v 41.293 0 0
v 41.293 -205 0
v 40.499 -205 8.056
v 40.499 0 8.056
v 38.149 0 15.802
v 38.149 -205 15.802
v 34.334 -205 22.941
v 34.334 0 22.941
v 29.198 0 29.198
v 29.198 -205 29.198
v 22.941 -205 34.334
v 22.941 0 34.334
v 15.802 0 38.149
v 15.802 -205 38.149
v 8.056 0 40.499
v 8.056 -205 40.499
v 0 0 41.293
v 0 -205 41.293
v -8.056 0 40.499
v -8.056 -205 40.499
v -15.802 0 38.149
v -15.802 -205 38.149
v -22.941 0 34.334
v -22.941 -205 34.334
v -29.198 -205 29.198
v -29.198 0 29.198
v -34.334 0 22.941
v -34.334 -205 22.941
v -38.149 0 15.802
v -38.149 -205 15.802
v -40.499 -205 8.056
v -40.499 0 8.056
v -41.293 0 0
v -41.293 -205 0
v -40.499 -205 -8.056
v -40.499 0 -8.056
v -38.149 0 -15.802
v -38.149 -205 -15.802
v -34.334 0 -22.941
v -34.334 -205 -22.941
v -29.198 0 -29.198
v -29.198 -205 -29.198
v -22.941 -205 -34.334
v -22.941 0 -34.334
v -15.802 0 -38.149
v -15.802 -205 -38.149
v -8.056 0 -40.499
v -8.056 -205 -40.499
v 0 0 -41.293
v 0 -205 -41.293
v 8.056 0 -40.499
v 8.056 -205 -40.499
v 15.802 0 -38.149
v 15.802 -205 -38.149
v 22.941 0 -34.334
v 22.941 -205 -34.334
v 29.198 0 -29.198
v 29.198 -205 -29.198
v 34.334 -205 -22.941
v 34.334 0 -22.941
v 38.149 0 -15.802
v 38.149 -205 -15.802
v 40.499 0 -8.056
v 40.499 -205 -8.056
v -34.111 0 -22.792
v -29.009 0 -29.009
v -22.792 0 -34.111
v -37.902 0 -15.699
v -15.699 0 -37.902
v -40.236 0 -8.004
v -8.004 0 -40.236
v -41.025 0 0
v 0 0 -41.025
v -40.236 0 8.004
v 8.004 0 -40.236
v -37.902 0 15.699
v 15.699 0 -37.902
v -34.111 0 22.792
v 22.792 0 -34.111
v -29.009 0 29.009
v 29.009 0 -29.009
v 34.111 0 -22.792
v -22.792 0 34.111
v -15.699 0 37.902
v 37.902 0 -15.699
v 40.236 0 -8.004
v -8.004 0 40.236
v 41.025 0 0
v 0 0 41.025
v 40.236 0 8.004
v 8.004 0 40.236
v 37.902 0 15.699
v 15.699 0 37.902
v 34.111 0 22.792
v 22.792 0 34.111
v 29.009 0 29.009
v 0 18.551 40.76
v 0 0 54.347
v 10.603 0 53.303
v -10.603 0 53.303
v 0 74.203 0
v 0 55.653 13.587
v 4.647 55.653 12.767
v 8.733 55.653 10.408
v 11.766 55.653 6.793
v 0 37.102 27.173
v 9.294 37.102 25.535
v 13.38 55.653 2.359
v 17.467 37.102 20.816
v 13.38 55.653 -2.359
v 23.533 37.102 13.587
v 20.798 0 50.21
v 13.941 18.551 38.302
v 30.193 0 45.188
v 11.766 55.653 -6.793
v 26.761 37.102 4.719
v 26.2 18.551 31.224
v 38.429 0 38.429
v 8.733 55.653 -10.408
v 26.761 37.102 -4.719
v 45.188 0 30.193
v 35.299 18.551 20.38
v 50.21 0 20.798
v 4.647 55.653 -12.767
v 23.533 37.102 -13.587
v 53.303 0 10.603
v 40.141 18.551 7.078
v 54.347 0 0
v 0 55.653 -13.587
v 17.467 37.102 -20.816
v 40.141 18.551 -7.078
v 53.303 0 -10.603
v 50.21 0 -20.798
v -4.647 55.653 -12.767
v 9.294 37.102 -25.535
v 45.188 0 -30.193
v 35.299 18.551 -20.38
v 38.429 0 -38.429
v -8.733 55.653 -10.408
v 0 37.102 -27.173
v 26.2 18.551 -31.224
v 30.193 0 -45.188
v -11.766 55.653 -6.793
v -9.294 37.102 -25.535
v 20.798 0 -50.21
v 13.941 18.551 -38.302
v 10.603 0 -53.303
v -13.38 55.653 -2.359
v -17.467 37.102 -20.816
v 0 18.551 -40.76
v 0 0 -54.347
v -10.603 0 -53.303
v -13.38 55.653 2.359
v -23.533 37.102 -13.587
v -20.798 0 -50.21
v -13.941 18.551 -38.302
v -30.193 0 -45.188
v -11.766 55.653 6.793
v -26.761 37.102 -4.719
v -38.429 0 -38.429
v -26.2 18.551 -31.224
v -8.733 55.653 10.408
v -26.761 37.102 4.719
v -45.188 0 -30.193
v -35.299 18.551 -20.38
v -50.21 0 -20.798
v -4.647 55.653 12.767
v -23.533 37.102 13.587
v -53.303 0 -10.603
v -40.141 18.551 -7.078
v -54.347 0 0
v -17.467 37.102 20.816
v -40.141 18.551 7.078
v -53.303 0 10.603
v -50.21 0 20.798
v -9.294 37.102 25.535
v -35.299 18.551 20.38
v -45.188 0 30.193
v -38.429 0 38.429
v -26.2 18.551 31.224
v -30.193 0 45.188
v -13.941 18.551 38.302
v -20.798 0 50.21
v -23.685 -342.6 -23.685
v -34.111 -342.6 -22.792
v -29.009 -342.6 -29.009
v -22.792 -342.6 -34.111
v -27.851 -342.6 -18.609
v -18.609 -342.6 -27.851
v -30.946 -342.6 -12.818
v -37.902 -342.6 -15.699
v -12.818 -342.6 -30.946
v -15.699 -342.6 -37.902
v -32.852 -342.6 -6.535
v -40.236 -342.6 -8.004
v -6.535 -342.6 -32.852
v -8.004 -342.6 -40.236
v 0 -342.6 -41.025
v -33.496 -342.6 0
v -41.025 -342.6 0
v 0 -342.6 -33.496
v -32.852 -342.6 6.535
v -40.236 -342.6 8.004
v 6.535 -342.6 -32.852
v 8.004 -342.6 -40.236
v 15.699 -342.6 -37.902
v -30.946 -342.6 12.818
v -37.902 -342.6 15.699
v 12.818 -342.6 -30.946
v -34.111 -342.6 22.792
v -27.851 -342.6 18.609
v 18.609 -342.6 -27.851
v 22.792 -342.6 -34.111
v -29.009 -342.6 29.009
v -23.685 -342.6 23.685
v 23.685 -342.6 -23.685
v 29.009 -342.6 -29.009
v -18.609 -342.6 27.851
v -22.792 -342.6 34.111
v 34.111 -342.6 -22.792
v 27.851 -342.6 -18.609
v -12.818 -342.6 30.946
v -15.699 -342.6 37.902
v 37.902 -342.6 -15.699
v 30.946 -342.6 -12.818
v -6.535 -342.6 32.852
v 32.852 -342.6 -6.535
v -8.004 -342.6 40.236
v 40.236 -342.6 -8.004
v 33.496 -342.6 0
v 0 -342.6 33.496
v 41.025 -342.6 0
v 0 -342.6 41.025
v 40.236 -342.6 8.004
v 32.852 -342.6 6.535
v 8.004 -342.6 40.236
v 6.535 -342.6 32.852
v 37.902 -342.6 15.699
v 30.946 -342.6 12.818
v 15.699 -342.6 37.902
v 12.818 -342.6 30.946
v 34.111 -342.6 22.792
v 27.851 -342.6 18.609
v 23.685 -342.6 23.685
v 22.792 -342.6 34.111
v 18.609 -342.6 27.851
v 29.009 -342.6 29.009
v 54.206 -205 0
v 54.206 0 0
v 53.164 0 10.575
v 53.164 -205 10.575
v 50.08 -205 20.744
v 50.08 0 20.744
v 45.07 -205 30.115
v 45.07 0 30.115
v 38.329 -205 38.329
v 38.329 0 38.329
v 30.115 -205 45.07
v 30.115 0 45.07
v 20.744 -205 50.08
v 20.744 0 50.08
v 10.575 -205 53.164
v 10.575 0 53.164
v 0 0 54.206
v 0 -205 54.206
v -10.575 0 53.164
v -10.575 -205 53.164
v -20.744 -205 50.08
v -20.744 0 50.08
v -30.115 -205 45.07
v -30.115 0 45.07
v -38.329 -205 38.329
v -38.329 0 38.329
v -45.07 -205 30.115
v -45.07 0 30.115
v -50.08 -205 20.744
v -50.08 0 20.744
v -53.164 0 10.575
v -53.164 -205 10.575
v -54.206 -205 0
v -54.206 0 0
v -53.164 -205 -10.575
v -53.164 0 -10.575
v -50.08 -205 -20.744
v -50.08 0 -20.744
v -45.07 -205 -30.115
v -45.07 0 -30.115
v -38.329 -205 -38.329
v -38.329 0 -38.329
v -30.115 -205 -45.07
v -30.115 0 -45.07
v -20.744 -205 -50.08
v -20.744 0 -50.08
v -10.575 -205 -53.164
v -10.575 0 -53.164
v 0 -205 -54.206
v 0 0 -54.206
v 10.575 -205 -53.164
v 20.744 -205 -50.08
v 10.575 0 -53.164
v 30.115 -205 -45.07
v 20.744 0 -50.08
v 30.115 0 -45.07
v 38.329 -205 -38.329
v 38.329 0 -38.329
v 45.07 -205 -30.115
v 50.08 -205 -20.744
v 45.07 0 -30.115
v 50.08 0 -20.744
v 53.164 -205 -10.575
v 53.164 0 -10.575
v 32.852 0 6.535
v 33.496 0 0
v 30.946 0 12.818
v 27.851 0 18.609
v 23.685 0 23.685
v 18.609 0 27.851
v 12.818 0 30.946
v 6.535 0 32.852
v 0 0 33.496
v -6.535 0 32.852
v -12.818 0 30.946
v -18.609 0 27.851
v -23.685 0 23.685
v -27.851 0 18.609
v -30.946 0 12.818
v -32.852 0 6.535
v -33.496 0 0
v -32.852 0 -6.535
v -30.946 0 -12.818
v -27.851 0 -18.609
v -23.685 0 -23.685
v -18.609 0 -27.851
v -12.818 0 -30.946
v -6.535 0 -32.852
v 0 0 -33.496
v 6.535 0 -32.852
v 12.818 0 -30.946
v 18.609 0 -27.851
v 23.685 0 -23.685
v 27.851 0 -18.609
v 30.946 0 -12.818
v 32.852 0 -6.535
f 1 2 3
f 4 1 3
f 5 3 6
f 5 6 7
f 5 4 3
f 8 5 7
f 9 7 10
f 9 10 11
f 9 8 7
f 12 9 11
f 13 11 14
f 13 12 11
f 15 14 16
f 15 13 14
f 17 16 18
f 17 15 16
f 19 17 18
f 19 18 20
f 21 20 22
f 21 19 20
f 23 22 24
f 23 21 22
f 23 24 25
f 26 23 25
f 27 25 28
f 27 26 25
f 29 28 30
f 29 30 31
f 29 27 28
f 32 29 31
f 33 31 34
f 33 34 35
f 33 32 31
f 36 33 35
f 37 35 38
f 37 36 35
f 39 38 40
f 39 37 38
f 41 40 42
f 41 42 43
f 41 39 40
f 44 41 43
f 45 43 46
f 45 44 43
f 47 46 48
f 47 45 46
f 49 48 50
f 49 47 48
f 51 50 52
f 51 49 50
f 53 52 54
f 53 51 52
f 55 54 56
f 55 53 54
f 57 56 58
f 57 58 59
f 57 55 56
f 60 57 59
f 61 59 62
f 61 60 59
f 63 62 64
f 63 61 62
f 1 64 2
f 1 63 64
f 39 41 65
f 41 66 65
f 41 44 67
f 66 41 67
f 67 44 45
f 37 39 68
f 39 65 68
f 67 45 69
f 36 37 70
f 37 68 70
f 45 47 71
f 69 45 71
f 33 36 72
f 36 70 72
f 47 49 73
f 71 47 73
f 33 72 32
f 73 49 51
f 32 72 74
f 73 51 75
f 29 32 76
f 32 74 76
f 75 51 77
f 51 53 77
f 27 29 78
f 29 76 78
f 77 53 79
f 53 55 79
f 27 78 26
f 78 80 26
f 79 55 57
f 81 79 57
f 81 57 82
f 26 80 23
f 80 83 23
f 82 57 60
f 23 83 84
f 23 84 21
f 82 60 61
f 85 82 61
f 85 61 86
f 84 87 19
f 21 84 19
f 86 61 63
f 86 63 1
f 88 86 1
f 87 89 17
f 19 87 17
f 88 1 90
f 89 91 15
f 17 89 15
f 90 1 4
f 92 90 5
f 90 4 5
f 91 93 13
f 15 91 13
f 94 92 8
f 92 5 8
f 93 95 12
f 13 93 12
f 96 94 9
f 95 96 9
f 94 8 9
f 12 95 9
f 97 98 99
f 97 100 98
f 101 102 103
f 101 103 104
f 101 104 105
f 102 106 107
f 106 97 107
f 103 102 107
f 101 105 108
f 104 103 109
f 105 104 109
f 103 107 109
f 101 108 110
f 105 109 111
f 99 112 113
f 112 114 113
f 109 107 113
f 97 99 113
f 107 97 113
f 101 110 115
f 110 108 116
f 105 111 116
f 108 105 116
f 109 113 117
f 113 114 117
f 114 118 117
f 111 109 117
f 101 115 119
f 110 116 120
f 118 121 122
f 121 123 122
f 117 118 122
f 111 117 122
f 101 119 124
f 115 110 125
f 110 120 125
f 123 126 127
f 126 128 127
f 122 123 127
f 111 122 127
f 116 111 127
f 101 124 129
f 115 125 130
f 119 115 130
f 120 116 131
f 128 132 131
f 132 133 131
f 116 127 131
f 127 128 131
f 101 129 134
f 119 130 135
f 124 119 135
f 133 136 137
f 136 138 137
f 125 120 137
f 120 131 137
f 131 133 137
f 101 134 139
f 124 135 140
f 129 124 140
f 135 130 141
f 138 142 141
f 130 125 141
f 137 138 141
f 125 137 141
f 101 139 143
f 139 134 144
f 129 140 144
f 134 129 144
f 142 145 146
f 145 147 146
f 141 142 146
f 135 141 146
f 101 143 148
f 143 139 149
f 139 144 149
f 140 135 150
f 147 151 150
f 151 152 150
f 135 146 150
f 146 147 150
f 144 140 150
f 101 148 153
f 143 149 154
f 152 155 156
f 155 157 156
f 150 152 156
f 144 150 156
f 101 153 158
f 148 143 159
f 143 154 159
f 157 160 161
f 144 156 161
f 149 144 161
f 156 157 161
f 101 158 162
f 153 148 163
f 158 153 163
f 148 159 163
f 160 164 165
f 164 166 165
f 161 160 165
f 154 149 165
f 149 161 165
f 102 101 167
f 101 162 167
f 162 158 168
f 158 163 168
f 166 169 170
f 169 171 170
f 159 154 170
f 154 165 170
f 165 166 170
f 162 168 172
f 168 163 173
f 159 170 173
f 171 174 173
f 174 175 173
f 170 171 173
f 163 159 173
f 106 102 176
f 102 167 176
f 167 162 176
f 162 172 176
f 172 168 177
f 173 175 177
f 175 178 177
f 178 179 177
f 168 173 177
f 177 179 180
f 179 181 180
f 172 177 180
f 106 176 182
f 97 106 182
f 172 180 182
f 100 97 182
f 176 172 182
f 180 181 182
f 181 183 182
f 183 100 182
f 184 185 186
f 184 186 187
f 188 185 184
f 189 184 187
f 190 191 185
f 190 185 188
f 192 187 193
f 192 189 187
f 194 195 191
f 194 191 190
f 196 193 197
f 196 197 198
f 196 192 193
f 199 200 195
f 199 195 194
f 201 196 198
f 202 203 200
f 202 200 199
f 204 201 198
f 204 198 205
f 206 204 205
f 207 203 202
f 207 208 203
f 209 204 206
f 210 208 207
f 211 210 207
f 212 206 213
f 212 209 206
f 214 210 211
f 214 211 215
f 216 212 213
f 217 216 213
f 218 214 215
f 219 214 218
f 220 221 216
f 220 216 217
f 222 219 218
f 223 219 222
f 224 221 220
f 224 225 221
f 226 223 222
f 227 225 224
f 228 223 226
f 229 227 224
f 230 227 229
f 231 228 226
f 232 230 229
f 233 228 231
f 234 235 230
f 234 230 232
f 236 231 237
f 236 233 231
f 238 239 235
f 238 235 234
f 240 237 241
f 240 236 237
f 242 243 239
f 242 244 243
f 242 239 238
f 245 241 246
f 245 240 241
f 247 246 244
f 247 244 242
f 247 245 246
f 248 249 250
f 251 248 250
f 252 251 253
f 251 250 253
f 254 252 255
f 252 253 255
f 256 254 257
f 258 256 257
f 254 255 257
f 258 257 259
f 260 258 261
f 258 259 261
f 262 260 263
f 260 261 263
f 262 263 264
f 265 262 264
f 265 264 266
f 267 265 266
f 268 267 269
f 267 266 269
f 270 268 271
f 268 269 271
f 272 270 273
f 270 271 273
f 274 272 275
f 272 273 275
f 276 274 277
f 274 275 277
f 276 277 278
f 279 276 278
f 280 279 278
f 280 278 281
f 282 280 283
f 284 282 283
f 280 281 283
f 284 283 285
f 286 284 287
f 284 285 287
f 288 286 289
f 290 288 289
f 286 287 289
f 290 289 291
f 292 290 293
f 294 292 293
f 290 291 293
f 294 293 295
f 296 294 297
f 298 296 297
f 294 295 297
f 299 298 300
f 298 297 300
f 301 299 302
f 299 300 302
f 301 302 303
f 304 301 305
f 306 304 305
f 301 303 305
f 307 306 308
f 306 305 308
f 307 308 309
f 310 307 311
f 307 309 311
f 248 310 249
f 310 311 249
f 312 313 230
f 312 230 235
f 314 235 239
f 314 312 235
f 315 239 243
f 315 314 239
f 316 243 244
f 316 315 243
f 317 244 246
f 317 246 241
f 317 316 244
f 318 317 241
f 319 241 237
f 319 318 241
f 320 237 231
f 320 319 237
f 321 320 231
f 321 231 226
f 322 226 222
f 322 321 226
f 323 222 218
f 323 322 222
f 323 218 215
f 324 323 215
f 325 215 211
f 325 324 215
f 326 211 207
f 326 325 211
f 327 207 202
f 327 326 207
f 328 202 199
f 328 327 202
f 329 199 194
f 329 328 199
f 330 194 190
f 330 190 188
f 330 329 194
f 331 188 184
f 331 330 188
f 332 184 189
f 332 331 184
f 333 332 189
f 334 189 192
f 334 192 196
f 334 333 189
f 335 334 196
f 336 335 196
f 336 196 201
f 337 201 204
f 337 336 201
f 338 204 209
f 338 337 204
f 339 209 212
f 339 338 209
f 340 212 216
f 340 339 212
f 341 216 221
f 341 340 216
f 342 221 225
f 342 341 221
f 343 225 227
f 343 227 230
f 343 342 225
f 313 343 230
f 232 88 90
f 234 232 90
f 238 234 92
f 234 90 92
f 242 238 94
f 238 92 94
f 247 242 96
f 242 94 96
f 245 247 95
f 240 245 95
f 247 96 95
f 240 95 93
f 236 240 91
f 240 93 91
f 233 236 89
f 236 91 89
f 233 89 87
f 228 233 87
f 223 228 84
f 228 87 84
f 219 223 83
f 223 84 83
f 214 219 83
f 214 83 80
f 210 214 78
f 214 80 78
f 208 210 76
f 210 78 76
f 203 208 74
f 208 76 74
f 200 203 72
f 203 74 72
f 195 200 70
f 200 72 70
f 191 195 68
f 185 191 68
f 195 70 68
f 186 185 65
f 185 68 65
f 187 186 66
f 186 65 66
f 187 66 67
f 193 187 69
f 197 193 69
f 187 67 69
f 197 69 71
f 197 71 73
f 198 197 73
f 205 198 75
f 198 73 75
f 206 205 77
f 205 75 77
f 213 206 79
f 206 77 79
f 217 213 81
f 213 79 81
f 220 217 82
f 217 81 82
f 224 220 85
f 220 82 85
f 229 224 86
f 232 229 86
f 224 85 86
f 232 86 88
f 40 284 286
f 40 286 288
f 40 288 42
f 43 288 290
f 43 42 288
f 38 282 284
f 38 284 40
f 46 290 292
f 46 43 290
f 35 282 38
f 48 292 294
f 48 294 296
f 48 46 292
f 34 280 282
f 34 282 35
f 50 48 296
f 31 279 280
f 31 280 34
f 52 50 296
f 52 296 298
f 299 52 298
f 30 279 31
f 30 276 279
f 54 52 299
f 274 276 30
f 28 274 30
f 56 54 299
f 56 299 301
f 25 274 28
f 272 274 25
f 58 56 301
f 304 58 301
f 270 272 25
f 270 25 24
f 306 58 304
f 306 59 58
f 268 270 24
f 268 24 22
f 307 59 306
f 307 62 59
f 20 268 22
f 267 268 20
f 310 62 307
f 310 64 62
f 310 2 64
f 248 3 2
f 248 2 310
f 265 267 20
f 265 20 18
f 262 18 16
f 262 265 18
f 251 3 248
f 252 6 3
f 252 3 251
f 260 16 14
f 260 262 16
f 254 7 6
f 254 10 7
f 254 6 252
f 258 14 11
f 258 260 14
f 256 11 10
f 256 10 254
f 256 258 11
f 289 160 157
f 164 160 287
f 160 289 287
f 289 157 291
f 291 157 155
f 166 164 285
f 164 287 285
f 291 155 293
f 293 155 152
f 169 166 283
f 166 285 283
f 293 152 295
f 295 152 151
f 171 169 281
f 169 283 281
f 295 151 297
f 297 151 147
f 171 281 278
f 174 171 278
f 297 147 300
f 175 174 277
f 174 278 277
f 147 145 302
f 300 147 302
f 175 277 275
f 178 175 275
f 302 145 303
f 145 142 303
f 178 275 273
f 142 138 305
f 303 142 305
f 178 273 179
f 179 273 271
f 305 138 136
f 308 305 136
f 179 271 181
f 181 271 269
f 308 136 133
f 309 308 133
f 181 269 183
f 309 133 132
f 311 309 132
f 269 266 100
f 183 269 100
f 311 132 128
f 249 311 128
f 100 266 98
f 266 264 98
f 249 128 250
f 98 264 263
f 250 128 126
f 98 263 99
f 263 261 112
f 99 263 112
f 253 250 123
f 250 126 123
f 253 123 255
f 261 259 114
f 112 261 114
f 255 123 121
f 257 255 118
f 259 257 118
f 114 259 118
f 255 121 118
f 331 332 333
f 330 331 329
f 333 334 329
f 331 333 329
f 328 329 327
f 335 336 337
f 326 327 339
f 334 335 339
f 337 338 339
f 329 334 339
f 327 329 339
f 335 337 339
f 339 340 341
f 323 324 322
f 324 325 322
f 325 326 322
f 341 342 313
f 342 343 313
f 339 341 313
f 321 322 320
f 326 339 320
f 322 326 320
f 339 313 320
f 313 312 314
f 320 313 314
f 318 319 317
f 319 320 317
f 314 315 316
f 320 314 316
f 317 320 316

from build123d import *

# Parameters (mm, degrees)
F0_R     = 54.205812
F0_R_2   = 41.292584
F1_DEPTH = 205
F4_R     = 41.024739
F4_R_2   = 33.495835
F5_DEPTH = 342.6


with BuildPart() as f1:
    # F0 (on Front) → F1 (new body)
    with BuildSketch(Plane.XZ):
        Circle(F0_R)
        Circle(F0_R_2, mode=Mode.SUBTRACT)
    extrude(amount=F1_DEPTH)

    # F2 (on Right) → F3 (revolve)
    with BuildSketch(Plane.YZ):
        Polygon((0, 54.346781), (0, 0), (74.203447, 0), align=None)
    revolve(axis=Axis((0, 37.101723, 0), (0, 1, 0)))

    # F4 (on Front) → F5 (join)
    with BuildSketch(Plane.XZ):
        Circle(F4_R)
        Circle(F4_R_2, mode=Mode.SUBTRACT)
    extrude(amount=F5_DEPTH)


solid = f1.part
